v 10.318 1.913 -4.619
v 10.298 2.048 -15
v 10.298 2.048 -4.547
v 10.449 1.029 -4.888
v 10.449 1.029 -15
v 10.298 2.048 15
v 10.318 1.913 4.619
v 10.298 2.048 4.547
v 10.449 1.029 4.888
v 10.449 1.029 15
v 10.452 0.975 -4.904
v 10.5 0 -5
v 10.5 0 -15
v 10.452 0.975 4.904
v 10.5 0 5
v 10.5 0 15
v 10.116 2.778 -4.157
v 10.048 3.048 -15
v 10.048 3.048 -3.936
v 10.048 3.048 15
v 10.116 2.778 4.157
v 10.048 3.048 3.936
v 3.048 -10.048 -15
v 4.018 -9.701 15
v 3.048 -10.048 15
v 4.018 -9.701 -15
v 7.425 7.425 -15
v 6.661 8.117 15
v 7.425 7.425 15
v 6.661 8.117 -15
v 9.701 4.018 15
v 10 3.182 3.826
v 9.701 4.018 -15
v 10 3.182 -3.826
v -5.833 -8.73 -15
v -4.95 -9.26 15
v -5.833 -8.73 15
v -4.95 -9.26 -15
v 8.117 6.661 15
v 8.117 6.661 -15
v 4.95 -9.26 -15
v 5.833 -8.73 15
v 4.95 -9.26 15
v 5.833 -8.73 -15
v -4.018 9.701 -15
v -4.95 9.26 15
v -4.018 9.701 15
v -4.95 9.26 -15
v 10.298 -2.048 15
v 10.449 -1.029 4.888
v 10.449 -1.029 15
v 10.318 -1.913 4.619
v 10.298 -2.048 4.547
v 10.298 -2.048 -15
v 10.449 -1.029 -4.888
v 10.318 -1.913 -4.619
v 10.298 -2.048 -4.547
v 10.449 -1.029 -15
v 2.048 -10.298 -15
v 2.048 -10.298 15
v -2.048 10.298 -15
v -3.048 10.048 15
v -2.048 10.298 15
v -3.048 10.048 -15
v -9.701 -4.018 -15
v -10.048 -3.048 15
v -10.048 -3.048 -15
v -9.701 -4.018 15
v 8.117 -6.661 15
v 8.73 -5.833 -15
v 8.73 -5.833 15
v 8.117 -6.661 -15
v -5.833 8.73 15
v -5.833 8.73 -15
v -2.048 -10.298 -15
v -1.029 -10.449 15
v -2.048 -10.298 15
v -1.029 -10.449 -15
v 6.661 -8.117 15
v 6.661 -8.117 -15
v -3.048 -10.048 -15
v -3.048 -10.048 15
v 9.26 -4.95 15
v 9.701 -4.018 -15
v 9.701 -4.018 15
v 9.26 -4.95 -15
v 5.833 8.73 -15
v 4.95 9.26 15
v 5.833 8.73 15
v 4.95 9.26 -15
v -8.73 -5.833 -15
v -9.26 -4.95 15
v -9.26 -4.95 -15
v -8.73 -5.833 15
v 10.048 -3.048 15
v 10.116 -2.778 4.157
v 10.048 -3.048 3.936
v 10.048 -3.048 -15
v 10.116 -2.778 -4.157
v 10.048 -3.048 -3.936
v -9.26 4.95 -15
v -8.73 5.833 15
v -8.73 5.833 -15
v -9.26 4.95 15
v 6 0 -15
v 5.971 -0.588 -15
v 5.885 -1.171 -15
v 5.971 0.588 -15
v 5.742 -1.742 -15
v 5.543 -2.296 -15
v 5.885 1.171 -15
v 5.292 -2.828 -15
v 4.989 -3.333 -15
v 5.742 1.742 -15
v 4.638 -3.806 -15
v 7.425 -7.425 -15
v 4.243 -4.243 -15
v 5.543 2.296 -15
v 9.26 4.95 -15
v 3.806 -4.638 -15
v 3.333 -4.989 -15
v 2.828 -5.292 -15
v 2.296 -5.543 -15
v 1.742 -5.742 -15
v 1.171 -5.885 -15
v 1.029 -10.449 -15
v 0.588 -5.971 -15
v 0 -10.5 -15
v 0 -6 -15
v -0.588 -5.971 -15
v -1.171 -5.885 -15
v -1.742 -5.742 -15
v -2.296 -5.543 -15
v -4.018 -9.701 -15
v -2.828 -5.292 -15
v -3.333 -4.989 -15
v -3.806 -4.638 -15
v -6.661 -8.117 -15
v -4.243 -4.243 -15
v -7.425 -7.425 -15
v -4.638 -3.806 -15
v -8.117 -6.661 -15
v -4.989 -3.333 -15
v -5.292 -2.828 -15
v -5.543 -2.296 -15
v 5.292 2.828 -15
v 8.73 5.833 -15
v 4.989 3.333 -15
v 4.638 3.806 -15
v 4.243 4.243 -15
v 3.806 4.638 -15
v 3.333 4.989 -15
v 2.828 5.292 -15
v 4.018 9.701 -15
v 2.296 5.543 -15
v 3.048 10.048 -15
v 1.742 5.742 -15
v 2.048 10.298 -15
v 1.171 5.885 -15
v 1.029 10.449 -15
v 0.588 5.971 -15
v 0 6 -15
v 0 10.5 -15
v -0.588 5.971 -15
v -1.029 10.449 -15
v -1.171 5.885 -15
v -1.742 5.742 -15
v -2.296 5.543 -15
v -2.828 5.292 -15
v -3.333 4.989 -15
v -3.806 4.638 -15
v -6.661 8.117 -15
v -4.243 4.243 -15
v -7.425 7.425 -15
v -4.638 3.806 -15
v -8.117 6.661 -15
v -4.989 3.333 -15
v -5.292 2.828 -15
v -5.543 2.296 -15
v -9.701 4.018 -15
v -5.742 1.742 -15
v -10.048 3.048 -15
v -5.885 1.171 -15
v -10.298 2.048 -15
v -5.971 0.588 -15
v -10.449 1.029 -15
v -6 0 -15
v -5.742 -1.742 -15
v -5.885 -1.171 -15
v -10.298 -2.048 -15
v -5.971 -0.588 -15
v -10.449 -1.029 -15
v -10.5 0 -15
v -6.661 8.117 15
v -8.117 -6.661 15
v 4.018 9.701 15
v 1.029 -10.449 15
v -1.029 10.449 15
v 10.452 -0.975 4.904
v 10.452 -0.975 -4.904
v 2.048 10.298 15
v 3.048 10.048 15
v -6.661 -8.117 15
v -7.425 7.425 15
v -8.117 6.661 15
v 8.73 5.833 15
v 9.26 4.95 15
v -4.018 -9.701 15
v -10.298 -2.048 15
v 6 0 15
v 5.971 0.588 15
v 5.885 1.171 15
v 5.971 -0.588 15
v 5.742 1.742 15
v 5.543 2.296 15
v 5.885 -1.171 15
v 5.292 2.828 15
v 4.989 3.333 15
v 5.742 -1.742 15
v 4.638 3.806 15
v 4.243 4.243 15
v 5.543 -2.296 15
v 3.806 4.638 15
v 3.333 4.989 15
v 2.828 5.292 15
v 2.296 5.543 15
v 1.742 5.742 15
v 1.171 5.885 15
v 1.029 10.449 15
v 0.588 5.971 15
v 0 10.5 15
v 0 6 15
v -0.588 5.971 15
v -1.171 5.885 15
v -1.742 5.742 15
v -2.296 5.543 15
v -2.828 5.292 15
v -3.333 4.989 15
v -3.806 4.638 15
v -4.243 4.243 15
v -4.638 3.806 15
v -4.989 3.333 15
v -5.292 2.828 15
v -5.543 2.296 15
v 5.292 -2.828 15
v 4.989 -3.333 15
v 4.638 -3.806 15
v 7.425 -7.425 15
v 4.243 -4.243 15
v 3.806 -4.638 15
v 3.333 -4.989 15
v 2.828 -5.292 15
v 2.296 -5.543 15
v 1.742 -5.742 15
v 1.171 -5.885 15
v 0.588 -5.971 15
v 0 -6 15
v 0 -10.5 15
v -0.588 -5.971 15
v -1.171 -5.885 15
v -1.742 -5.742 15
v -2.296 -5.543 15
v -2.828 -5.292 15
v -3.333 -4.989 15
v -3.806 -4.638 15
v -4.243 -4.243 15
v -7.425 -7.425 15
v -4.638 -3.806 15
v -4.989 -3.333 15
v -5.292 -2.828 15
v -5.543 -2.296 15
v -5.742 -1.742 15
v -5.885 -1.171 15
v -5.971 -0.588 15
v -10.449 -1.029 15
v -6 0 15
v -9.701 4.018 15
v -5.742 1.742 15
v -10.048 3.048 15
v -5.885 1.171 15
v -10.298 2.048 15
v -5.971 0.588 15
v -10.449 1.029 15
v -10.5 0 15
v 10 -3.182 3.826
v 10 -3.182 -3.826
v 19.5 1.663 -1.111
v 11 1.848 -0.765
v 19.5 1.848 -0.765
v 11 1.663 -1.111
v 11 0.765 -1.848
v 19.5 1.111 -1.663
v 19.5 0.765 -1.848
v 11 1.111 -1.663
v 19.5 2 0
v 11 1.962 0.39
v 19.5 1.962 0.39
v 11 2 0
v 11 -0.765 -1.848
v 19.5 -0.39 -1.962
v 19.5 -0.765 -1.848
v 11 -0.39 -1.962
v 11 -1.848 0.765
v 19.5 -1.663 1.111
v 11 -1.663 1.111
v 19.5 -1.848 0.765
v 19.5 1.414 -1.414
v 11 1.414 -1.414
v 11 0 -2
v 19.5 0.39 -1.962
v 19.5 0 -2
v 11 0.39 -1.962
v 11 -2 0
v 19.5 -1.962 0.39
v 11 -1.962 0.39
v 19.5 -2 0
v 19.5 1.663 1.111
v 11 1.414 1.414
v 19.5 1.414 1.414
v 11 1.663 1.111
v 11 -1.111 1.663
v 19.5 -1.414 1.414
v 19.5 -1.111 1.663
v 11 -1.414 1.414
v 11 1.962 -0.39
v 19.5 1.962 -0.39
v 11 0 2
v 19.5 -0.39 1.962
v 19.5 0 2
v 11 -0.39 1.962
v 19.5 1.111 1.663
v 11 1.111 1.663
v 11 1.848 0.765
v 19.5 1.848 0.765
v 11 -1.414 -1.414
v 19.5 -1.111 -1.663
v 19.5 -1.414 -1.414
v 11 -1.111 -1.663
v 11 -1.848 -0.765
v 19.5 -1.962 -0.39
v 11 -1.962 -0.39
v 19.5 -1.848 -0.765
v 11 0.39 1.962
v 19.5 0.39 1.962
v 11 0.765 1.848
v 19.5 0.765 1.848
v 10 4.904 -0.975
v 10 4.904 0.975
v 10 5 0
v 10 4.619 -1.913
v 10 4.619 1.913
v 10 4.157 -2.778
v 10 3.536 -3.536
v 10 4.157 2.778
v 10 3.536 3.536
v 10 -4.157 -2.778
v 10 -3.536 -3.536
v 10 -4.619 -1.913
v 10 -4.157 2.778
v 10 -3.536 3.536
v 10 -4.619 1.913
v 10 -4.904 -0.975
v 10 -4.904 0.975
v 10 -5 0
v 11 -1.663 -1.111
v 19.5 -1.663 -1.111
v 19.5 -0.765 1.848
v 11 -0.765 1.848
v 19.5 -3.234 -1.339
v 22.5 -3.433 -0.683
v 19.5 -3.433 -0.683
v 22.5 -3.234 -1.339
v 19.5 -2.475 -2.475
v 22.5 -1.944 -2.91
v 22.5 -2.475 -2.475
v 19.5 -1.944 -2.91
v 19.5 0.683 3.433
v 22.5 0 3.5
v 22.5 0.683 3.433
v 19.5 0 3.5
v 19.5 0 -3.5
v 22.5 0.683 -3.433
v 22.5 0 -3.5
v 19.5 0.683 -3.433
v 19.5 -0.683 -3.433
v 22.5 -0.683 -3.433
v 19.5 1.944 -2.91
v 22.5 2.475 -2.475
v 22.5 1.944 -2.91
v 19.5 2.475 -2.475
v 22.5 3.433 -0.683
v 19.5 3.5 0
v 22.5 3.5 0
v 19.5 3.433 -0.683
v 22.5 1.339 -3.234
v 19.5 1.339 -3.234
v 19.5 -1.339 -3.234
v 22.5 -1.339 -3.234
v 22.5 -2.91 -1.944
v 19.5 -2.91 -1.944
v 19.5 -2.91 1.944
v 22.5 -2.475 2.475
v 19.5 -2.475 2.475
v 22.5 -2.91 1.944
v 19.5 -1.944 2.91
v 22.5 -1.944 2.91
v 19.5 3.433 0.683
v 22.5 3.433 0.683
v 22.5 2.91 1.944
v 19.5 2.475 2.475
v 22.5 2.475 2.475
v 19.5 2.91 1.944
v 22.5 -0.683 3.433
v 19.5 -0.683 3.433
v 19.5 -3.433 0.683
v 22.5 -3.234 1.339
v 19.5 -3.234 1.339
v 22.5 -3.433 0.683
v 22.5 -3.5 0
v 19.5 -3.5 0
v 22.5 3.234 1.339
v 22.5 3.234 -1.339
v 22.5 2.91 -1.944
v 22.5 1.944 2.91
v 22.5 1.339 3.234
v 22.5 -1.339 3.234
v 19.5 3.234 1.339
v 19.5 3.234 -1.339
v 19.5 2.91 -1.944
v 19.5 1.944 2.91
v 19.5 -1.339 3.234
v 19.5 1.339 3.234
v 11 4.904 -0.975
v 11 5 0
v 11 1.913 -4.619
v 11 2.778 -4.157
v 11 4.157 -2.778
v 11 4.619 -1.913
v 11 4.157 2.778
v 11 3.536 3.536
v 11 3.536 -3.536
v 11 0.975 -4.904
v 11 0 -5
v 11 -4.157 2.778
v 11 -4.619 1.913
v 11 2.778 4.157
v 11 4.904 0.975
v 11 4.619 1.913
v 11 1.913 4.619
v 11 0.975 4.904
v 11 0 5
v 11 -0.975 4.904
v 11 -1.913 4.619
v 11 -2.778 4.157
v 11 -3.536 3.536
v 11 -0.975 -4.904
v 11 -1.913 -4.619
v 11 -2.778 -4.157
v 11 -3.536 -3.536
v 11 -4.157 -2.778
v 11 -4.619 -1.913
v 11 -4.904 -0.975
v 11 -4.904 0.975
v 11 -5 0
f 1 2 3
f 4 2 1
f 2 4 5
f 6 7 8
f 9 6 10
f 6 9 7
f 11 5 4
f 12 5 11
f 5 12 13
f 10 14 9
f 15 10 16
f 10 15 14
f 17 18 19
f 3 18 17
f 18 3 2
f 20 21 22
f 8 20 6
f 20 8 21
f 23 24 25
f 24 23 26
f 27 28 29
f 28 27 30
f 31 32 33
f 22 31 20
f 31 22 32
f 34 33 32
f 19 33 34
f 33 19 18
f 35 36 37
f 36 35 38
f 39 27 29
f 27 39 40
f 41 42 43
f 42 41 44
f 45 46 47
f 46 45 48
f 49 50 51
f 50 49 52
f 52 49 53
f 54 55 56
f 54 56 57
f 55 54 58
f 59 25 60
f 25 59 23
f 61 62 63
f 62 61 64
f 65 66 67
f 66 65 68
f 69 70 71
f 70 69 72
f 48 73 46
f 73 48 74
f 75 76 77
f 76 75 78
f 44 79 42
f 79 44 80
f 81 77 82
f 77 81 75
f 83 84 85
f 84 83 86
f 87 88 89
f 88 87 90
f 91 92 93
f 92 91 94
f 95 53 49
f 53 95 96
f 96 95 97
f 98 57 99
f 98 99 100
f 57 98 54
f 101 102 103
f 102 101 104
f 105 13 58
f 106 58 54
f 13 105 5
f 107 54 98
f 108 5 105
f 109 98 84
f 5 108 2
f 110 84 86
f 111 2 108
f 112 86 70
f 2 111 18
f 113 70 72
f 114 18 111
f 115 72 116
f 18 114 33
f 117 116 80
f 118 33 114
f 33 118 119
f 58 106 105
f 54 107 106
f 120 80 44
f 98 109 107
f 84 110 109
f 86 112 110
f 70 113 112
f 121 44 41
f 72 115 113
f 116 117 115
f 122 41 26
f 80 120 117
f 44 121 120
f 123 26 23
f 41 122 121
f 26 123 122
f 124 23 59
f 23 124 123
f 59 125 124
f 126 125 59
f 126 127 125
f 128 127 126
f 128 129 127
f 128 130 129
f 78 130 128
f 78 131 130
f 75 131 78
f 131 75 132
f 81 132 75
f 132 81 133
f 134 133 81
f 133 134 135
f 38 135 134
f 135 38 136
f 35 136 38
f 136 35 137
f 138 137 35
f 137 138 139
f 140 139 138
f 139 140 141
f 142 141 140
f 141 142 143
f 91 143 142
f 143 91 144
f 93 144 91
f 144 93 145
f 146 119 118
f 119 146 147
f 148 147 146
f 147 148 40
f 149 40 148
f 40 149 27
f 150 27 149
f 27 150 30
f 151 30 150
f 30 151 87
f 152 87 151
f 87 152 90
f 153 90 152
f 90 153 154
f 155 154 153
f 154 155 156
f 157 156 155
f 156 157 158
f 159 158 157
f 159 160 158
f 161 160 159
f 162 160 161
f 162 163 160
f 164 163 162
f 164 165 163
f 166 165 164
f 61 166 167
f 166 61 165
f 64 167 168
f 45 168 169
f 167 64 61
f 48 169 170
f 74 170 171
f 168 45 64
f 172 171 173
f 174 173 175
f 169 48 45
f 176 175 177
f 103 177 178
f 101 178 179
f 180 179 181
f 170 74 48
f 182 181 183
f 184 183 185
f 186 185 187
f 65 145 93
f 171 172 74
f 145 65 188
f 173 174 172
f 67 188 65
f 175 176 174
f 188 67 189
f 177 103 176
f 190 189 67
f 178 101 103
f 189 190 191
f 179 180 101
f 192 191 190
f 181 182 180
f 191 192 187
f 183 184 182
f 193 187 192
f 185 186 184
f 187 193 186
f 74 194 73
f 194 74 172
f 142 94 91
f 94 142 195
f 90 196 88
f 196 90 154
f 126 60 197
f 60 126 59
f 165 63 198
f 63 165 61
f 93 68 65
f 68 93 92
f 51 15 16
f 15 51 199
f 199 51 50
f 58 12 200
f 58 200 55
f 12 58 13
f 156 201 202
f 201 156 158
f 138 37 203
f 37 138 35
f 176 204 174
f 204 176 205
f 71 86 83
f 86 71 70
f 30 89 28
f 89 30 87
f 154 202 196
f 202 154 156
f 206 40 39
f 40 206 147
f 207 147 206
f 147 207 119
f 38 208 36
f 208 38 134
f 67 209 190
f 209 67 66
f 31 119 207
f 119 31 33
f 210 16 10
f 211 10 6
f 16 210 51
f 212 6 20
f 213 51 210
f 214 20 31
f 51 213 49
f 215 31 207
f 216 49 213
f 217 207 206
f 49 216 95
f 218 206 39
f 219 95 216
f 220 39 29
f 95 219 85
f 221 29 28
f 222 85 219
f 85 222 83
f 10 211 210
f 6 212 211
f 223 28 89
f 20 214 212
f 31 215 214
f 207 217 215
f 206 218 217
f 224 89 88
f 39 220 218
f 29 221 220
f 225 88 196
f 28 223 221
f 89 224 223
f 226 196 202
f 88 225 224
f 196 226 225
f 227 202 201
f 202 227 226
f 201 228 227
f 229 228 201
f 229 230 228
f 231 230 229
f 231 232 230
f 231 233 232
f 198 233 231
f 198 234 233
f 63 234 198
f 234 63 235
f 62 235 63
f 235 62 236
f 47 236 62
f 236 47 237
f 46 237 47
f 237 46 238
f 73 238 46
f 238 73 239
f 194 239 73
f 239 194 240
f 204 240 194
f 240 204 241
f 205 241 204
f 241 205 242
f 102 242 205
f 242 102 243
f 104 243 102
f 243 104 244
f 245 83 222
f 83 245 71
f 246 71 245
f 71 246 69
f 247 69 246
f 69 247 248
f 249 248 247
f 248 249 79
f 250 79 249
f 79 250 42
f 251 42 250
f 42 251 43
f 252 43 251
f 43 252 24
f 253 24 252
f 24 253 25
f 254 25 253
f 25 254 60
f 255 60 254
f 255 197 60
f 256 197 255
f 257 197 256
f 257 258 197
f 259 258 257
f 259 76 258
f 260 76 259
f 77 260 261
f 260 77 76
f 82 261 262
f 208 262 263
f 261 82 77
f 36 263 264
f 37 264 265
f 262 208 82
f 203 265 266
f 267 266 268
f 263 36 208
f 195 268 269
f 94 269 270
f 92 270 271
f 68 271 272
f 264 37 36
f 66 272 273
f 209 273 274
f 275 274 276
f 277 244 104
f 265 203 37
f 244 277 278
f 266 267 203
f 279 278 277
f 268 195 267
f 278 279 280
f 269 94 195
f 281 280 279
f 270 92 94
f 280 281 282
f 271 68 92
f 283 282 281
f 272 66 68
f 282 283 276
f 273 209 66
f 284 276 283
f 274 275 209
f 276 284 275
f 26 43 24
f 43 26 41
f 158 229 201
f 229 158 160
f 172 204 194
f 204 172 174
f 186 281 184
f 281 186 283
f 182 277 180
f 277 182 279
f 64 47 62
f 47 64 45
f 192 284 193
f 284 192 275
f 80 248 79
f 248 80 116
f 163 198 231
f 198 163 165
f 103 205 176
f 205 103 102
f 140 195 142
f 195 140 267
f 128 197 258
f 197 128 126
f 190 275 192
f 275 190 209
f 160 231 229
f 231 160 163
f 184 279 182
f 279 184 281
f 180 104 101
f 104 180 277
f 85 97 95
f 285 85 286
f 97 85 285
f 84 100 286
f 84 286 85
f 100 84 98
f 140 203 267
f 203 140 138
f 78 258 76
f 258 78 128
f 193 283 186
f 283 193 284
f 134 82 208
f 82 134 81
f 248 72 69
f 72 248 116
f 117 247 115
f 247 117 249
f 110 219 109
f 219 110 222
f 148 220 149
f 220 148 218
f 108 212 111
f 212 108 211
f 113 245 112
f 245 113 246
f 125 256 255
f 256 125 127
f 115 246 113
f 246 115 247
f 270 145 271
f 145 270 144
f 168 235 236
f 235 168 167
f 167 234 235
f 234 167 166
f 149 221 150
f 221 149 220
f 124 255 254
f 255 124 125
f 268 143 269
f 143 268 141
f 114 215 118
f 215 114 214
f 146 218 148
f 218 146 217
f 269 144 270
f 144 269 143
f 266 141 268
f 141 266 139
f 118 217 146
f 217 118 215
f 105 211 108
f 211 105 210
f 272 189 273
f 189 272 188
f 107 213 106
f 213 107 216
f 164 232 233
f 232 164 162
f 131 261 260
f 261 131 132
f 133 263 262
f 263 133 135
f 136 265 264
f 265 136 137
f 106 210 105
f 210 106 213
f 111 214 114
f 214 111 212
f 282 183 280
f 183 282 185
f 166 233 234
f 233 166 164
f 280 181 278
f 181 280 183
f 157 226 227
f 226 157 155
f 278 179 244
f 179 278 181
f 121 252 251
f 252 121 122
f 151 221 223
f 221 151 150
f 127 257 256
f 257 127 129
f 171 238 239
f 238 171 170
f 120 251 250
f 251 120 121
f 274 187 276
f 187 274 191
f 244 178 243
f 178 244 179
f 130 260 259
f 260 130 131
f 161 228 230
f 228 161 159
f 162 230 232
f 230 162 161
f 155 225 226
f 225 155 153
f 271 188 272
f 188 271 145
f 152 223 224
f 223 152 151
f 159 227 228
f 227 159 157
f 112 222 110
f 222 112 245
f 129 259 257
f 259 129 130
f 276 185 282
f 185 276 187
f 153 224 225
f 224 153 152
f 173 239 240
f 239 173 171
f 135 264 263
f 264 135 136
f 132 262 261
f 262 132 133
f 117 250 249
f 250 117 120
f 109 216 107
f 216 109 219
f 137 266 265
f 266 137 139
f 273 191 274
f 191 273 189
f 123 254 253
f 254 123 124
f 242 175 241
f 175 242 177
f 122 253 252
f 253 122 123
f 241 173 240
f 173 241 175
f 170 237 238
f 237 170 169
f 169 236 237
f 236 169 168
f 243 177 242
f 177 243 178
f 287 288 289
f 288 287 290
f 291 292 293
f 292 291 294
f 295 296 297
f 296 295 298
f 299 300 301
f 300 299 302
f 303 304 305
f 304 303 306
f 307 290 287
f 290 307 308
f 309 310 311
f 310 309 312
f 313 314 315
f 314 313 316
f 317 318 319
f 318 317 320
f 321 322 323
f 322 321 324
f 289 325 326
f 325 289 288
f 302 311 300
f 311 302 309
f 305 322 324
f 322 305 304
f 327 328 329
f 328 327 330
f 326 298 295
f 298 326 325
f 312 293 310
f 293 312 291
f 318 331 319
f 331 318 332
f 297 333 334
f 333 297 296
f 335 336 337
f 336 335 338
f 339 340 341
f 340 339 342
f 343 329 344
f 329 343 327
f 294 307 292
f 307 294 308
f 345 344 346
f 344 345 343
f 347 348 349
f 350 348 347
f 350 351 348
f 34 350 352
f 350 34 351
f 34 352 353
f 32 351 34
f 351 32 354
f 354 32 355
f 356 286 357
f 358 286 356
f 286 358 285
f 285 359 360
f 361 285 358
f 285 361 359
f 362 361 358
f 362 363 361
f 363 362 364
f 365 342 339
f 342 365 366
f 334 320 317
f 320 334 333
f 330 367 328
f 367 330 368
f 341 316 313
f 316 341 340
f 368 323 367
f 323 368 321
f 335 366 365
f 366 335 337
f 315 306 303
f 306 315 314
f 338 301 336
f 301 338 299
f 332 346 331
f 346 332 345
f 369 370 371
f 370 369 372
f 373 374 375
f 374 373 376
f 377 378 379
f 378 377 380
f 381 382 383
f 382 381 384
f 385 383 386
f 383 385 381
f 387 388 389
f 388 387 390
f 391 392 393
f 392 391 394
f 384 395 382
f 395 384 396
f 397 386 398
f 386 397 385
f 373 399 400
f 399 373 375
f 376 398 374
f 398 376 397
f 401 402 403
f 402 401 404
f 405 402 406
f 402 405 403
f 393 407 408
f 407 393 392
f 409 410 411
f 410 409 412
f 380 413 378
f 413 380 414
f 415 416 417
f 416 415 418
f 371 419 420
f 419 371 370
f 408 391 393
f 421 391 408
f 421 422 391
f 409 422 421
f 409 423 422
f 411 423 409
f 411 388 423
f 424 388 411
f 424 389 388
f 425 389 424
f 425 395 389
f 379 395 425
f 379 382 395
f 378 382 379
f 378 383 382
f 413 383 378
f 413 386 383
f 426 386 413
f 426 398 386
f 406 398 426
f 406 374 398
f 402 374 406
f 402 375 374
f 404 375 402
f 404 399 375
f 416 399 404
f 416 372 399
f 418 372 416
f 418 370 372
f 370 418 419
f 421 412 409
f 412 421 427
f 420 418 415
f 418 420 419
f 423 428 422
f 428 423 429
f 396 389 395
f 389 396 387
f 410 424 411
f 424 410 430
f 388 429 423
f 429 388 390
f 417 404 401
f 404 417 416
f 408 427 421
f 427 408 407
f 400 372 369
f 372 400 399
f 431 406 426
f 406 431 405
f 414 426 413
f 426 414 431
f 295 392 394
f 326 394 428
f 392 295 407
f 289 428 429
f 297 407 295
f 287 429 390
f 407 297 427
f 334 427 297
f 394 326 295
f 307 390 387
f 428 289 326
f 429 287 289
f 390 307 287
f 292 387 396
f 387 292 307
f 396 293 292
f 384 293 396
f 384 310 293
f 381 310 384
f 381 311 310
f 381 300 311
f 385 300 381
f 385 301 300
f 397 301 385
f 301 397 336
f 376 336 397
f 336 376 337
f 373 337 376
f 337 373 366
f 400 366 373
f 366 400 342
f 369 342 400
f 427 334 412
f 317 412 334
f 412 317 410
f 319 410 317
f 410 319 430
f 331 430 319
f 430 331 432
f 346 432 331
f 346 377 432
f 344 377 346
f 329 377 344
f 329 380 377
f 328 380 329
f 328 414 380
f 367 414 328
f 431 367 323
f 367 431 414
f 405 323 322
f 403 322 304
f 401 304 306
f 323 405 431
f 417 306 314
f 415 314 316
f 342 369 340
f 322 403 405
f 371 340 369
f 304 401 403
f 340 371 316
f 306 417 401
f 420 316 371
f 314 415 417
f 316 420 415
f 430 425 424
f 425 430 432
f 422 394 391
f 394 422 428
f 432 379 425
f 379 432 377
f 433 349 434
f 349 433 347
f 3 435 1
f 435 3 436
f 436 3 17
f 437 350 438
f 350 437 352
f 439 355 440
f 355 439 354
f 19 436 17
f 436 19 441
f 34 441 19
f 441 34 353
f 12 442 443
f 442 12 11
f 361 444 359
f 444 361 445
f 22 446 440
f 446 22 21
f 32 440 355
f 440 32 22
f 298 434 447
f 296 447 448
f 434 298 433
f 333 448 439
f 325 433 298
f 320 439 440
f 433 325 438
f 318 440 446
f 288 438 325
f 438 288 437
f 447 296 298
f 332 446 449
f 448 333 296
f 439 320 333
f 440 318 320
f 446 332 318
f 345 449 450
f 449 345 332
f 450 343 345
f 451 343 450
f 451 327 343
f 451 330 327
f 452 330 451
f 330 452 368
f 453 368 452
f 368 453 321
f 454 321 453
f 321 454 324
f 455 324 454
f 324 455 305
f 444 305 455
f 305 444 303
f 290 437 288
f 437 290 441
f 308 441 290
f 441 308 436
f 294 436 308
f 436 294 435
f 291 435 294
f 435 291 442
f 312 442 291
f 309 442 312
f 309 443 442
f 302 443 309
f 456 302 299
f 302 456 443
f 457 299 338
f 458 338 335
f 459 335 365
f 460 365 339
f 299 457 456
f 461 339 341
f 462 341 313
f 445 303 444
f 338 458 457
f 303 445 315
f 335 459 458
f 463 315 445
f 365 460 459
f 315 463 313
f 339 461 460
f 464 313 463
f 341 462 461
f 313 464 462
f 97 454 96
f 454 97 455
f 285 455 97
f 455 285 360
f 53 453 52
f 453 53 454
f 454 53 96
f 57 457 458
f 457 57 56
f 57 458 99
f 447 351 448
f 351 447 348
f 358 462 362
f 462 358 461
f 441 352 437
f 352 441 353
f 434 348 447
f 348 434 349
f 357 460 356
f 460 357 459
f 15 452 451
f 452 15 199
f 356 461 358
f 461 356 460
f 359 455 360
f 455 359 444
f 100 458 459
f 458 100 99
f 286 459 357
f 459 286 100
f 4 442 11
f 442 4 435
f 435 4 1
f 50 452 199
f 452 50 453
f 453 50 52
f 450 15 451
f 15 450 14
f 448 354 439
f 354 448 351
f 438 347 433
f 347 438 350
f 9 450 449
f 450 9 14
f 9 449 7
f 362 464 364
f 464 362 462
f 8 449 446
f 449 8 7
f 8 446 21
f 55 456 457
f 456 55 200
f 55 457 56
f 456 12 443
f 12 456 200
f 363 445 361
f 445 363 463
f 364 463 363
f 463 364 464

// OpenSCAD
// Parameters
bore_diameter_mm = 12; //[6:24:0.1]
outer_diameter_mm = 21; //[10.5:42:0.1]
length_mm = 30; //[15:60:0.1]
wall_thickness_mm = 4.5; //[2.25:9:0.1]
inner_radius_mm = 6; //[3:12:0.05]
outer_radius_mm = 10.5; //[5.25:21:0.05]
eps_mm = 0.5; //[0.2:2:0.1]
screw_shank_diameter_mm = 4; //[2:8:0.1]
screw_length_mm = 10; //[5:25:0.1]
screw_head_diameter_mm = 7; //[4:14:0.1]
screw_head_height_mm = 3; //[1.5:6:0.1]
washer_outer_diameter_mm = 10; //[6:20:0.1]
washer_thickness_mm = 1; //[0.5:3:0.1]

// Linear Bearing - complete geometry
module linear_bearing() {
  color("DimGray") {
    difference() {
      // Outer sleeve
      cylinder(h=length_mm, r=outer_diameter_mm/2, center=true, $fn=64);
      // Through bore
      cylinder(h=length_mm + 2*eps_mm, r=bore_diameter_mm/2, center=true, $fn=64);
    }
  }
}

// Screw and Washer - complete geometry
module screw_and_washer() {
  color("Silver") {
    union() {
      // Screw shank
      translate([outer_diameter_mm/2 + screw_length_mm/2 - eps_mm, 0, 0])
        rotate([0, 90, 0])
        cylinder(h=screw_length_mm, r=screw_shank_diameter_mm/2, center=true, $fn=32);
      
      // Screw head
      translate([outer_diameter_mm/2 + screw_length_mm + screw_head_height_mm/2 - 2*eps_mm, 0, 0])
        rotate([0, 90, 0])
        cylinder(h=screw_head_height_mm, r=screw_head_diameter_mm/2, center=true, $fn=32);
      
      // Washer
      translate([outer_diameter_mm/2 + washer_thickness_mm/2 - eps_mm, 0, 0])
        rotate([0, 90, 0])
        cylinder(h=washer_thickness_mm, r=washer_outer_diameter_mm/2, center=true, $fn=32);
    }
  }
}

// Assembly
module assembly() {
  linear_bearing();
  screw_and_washer();
}

assembly();
